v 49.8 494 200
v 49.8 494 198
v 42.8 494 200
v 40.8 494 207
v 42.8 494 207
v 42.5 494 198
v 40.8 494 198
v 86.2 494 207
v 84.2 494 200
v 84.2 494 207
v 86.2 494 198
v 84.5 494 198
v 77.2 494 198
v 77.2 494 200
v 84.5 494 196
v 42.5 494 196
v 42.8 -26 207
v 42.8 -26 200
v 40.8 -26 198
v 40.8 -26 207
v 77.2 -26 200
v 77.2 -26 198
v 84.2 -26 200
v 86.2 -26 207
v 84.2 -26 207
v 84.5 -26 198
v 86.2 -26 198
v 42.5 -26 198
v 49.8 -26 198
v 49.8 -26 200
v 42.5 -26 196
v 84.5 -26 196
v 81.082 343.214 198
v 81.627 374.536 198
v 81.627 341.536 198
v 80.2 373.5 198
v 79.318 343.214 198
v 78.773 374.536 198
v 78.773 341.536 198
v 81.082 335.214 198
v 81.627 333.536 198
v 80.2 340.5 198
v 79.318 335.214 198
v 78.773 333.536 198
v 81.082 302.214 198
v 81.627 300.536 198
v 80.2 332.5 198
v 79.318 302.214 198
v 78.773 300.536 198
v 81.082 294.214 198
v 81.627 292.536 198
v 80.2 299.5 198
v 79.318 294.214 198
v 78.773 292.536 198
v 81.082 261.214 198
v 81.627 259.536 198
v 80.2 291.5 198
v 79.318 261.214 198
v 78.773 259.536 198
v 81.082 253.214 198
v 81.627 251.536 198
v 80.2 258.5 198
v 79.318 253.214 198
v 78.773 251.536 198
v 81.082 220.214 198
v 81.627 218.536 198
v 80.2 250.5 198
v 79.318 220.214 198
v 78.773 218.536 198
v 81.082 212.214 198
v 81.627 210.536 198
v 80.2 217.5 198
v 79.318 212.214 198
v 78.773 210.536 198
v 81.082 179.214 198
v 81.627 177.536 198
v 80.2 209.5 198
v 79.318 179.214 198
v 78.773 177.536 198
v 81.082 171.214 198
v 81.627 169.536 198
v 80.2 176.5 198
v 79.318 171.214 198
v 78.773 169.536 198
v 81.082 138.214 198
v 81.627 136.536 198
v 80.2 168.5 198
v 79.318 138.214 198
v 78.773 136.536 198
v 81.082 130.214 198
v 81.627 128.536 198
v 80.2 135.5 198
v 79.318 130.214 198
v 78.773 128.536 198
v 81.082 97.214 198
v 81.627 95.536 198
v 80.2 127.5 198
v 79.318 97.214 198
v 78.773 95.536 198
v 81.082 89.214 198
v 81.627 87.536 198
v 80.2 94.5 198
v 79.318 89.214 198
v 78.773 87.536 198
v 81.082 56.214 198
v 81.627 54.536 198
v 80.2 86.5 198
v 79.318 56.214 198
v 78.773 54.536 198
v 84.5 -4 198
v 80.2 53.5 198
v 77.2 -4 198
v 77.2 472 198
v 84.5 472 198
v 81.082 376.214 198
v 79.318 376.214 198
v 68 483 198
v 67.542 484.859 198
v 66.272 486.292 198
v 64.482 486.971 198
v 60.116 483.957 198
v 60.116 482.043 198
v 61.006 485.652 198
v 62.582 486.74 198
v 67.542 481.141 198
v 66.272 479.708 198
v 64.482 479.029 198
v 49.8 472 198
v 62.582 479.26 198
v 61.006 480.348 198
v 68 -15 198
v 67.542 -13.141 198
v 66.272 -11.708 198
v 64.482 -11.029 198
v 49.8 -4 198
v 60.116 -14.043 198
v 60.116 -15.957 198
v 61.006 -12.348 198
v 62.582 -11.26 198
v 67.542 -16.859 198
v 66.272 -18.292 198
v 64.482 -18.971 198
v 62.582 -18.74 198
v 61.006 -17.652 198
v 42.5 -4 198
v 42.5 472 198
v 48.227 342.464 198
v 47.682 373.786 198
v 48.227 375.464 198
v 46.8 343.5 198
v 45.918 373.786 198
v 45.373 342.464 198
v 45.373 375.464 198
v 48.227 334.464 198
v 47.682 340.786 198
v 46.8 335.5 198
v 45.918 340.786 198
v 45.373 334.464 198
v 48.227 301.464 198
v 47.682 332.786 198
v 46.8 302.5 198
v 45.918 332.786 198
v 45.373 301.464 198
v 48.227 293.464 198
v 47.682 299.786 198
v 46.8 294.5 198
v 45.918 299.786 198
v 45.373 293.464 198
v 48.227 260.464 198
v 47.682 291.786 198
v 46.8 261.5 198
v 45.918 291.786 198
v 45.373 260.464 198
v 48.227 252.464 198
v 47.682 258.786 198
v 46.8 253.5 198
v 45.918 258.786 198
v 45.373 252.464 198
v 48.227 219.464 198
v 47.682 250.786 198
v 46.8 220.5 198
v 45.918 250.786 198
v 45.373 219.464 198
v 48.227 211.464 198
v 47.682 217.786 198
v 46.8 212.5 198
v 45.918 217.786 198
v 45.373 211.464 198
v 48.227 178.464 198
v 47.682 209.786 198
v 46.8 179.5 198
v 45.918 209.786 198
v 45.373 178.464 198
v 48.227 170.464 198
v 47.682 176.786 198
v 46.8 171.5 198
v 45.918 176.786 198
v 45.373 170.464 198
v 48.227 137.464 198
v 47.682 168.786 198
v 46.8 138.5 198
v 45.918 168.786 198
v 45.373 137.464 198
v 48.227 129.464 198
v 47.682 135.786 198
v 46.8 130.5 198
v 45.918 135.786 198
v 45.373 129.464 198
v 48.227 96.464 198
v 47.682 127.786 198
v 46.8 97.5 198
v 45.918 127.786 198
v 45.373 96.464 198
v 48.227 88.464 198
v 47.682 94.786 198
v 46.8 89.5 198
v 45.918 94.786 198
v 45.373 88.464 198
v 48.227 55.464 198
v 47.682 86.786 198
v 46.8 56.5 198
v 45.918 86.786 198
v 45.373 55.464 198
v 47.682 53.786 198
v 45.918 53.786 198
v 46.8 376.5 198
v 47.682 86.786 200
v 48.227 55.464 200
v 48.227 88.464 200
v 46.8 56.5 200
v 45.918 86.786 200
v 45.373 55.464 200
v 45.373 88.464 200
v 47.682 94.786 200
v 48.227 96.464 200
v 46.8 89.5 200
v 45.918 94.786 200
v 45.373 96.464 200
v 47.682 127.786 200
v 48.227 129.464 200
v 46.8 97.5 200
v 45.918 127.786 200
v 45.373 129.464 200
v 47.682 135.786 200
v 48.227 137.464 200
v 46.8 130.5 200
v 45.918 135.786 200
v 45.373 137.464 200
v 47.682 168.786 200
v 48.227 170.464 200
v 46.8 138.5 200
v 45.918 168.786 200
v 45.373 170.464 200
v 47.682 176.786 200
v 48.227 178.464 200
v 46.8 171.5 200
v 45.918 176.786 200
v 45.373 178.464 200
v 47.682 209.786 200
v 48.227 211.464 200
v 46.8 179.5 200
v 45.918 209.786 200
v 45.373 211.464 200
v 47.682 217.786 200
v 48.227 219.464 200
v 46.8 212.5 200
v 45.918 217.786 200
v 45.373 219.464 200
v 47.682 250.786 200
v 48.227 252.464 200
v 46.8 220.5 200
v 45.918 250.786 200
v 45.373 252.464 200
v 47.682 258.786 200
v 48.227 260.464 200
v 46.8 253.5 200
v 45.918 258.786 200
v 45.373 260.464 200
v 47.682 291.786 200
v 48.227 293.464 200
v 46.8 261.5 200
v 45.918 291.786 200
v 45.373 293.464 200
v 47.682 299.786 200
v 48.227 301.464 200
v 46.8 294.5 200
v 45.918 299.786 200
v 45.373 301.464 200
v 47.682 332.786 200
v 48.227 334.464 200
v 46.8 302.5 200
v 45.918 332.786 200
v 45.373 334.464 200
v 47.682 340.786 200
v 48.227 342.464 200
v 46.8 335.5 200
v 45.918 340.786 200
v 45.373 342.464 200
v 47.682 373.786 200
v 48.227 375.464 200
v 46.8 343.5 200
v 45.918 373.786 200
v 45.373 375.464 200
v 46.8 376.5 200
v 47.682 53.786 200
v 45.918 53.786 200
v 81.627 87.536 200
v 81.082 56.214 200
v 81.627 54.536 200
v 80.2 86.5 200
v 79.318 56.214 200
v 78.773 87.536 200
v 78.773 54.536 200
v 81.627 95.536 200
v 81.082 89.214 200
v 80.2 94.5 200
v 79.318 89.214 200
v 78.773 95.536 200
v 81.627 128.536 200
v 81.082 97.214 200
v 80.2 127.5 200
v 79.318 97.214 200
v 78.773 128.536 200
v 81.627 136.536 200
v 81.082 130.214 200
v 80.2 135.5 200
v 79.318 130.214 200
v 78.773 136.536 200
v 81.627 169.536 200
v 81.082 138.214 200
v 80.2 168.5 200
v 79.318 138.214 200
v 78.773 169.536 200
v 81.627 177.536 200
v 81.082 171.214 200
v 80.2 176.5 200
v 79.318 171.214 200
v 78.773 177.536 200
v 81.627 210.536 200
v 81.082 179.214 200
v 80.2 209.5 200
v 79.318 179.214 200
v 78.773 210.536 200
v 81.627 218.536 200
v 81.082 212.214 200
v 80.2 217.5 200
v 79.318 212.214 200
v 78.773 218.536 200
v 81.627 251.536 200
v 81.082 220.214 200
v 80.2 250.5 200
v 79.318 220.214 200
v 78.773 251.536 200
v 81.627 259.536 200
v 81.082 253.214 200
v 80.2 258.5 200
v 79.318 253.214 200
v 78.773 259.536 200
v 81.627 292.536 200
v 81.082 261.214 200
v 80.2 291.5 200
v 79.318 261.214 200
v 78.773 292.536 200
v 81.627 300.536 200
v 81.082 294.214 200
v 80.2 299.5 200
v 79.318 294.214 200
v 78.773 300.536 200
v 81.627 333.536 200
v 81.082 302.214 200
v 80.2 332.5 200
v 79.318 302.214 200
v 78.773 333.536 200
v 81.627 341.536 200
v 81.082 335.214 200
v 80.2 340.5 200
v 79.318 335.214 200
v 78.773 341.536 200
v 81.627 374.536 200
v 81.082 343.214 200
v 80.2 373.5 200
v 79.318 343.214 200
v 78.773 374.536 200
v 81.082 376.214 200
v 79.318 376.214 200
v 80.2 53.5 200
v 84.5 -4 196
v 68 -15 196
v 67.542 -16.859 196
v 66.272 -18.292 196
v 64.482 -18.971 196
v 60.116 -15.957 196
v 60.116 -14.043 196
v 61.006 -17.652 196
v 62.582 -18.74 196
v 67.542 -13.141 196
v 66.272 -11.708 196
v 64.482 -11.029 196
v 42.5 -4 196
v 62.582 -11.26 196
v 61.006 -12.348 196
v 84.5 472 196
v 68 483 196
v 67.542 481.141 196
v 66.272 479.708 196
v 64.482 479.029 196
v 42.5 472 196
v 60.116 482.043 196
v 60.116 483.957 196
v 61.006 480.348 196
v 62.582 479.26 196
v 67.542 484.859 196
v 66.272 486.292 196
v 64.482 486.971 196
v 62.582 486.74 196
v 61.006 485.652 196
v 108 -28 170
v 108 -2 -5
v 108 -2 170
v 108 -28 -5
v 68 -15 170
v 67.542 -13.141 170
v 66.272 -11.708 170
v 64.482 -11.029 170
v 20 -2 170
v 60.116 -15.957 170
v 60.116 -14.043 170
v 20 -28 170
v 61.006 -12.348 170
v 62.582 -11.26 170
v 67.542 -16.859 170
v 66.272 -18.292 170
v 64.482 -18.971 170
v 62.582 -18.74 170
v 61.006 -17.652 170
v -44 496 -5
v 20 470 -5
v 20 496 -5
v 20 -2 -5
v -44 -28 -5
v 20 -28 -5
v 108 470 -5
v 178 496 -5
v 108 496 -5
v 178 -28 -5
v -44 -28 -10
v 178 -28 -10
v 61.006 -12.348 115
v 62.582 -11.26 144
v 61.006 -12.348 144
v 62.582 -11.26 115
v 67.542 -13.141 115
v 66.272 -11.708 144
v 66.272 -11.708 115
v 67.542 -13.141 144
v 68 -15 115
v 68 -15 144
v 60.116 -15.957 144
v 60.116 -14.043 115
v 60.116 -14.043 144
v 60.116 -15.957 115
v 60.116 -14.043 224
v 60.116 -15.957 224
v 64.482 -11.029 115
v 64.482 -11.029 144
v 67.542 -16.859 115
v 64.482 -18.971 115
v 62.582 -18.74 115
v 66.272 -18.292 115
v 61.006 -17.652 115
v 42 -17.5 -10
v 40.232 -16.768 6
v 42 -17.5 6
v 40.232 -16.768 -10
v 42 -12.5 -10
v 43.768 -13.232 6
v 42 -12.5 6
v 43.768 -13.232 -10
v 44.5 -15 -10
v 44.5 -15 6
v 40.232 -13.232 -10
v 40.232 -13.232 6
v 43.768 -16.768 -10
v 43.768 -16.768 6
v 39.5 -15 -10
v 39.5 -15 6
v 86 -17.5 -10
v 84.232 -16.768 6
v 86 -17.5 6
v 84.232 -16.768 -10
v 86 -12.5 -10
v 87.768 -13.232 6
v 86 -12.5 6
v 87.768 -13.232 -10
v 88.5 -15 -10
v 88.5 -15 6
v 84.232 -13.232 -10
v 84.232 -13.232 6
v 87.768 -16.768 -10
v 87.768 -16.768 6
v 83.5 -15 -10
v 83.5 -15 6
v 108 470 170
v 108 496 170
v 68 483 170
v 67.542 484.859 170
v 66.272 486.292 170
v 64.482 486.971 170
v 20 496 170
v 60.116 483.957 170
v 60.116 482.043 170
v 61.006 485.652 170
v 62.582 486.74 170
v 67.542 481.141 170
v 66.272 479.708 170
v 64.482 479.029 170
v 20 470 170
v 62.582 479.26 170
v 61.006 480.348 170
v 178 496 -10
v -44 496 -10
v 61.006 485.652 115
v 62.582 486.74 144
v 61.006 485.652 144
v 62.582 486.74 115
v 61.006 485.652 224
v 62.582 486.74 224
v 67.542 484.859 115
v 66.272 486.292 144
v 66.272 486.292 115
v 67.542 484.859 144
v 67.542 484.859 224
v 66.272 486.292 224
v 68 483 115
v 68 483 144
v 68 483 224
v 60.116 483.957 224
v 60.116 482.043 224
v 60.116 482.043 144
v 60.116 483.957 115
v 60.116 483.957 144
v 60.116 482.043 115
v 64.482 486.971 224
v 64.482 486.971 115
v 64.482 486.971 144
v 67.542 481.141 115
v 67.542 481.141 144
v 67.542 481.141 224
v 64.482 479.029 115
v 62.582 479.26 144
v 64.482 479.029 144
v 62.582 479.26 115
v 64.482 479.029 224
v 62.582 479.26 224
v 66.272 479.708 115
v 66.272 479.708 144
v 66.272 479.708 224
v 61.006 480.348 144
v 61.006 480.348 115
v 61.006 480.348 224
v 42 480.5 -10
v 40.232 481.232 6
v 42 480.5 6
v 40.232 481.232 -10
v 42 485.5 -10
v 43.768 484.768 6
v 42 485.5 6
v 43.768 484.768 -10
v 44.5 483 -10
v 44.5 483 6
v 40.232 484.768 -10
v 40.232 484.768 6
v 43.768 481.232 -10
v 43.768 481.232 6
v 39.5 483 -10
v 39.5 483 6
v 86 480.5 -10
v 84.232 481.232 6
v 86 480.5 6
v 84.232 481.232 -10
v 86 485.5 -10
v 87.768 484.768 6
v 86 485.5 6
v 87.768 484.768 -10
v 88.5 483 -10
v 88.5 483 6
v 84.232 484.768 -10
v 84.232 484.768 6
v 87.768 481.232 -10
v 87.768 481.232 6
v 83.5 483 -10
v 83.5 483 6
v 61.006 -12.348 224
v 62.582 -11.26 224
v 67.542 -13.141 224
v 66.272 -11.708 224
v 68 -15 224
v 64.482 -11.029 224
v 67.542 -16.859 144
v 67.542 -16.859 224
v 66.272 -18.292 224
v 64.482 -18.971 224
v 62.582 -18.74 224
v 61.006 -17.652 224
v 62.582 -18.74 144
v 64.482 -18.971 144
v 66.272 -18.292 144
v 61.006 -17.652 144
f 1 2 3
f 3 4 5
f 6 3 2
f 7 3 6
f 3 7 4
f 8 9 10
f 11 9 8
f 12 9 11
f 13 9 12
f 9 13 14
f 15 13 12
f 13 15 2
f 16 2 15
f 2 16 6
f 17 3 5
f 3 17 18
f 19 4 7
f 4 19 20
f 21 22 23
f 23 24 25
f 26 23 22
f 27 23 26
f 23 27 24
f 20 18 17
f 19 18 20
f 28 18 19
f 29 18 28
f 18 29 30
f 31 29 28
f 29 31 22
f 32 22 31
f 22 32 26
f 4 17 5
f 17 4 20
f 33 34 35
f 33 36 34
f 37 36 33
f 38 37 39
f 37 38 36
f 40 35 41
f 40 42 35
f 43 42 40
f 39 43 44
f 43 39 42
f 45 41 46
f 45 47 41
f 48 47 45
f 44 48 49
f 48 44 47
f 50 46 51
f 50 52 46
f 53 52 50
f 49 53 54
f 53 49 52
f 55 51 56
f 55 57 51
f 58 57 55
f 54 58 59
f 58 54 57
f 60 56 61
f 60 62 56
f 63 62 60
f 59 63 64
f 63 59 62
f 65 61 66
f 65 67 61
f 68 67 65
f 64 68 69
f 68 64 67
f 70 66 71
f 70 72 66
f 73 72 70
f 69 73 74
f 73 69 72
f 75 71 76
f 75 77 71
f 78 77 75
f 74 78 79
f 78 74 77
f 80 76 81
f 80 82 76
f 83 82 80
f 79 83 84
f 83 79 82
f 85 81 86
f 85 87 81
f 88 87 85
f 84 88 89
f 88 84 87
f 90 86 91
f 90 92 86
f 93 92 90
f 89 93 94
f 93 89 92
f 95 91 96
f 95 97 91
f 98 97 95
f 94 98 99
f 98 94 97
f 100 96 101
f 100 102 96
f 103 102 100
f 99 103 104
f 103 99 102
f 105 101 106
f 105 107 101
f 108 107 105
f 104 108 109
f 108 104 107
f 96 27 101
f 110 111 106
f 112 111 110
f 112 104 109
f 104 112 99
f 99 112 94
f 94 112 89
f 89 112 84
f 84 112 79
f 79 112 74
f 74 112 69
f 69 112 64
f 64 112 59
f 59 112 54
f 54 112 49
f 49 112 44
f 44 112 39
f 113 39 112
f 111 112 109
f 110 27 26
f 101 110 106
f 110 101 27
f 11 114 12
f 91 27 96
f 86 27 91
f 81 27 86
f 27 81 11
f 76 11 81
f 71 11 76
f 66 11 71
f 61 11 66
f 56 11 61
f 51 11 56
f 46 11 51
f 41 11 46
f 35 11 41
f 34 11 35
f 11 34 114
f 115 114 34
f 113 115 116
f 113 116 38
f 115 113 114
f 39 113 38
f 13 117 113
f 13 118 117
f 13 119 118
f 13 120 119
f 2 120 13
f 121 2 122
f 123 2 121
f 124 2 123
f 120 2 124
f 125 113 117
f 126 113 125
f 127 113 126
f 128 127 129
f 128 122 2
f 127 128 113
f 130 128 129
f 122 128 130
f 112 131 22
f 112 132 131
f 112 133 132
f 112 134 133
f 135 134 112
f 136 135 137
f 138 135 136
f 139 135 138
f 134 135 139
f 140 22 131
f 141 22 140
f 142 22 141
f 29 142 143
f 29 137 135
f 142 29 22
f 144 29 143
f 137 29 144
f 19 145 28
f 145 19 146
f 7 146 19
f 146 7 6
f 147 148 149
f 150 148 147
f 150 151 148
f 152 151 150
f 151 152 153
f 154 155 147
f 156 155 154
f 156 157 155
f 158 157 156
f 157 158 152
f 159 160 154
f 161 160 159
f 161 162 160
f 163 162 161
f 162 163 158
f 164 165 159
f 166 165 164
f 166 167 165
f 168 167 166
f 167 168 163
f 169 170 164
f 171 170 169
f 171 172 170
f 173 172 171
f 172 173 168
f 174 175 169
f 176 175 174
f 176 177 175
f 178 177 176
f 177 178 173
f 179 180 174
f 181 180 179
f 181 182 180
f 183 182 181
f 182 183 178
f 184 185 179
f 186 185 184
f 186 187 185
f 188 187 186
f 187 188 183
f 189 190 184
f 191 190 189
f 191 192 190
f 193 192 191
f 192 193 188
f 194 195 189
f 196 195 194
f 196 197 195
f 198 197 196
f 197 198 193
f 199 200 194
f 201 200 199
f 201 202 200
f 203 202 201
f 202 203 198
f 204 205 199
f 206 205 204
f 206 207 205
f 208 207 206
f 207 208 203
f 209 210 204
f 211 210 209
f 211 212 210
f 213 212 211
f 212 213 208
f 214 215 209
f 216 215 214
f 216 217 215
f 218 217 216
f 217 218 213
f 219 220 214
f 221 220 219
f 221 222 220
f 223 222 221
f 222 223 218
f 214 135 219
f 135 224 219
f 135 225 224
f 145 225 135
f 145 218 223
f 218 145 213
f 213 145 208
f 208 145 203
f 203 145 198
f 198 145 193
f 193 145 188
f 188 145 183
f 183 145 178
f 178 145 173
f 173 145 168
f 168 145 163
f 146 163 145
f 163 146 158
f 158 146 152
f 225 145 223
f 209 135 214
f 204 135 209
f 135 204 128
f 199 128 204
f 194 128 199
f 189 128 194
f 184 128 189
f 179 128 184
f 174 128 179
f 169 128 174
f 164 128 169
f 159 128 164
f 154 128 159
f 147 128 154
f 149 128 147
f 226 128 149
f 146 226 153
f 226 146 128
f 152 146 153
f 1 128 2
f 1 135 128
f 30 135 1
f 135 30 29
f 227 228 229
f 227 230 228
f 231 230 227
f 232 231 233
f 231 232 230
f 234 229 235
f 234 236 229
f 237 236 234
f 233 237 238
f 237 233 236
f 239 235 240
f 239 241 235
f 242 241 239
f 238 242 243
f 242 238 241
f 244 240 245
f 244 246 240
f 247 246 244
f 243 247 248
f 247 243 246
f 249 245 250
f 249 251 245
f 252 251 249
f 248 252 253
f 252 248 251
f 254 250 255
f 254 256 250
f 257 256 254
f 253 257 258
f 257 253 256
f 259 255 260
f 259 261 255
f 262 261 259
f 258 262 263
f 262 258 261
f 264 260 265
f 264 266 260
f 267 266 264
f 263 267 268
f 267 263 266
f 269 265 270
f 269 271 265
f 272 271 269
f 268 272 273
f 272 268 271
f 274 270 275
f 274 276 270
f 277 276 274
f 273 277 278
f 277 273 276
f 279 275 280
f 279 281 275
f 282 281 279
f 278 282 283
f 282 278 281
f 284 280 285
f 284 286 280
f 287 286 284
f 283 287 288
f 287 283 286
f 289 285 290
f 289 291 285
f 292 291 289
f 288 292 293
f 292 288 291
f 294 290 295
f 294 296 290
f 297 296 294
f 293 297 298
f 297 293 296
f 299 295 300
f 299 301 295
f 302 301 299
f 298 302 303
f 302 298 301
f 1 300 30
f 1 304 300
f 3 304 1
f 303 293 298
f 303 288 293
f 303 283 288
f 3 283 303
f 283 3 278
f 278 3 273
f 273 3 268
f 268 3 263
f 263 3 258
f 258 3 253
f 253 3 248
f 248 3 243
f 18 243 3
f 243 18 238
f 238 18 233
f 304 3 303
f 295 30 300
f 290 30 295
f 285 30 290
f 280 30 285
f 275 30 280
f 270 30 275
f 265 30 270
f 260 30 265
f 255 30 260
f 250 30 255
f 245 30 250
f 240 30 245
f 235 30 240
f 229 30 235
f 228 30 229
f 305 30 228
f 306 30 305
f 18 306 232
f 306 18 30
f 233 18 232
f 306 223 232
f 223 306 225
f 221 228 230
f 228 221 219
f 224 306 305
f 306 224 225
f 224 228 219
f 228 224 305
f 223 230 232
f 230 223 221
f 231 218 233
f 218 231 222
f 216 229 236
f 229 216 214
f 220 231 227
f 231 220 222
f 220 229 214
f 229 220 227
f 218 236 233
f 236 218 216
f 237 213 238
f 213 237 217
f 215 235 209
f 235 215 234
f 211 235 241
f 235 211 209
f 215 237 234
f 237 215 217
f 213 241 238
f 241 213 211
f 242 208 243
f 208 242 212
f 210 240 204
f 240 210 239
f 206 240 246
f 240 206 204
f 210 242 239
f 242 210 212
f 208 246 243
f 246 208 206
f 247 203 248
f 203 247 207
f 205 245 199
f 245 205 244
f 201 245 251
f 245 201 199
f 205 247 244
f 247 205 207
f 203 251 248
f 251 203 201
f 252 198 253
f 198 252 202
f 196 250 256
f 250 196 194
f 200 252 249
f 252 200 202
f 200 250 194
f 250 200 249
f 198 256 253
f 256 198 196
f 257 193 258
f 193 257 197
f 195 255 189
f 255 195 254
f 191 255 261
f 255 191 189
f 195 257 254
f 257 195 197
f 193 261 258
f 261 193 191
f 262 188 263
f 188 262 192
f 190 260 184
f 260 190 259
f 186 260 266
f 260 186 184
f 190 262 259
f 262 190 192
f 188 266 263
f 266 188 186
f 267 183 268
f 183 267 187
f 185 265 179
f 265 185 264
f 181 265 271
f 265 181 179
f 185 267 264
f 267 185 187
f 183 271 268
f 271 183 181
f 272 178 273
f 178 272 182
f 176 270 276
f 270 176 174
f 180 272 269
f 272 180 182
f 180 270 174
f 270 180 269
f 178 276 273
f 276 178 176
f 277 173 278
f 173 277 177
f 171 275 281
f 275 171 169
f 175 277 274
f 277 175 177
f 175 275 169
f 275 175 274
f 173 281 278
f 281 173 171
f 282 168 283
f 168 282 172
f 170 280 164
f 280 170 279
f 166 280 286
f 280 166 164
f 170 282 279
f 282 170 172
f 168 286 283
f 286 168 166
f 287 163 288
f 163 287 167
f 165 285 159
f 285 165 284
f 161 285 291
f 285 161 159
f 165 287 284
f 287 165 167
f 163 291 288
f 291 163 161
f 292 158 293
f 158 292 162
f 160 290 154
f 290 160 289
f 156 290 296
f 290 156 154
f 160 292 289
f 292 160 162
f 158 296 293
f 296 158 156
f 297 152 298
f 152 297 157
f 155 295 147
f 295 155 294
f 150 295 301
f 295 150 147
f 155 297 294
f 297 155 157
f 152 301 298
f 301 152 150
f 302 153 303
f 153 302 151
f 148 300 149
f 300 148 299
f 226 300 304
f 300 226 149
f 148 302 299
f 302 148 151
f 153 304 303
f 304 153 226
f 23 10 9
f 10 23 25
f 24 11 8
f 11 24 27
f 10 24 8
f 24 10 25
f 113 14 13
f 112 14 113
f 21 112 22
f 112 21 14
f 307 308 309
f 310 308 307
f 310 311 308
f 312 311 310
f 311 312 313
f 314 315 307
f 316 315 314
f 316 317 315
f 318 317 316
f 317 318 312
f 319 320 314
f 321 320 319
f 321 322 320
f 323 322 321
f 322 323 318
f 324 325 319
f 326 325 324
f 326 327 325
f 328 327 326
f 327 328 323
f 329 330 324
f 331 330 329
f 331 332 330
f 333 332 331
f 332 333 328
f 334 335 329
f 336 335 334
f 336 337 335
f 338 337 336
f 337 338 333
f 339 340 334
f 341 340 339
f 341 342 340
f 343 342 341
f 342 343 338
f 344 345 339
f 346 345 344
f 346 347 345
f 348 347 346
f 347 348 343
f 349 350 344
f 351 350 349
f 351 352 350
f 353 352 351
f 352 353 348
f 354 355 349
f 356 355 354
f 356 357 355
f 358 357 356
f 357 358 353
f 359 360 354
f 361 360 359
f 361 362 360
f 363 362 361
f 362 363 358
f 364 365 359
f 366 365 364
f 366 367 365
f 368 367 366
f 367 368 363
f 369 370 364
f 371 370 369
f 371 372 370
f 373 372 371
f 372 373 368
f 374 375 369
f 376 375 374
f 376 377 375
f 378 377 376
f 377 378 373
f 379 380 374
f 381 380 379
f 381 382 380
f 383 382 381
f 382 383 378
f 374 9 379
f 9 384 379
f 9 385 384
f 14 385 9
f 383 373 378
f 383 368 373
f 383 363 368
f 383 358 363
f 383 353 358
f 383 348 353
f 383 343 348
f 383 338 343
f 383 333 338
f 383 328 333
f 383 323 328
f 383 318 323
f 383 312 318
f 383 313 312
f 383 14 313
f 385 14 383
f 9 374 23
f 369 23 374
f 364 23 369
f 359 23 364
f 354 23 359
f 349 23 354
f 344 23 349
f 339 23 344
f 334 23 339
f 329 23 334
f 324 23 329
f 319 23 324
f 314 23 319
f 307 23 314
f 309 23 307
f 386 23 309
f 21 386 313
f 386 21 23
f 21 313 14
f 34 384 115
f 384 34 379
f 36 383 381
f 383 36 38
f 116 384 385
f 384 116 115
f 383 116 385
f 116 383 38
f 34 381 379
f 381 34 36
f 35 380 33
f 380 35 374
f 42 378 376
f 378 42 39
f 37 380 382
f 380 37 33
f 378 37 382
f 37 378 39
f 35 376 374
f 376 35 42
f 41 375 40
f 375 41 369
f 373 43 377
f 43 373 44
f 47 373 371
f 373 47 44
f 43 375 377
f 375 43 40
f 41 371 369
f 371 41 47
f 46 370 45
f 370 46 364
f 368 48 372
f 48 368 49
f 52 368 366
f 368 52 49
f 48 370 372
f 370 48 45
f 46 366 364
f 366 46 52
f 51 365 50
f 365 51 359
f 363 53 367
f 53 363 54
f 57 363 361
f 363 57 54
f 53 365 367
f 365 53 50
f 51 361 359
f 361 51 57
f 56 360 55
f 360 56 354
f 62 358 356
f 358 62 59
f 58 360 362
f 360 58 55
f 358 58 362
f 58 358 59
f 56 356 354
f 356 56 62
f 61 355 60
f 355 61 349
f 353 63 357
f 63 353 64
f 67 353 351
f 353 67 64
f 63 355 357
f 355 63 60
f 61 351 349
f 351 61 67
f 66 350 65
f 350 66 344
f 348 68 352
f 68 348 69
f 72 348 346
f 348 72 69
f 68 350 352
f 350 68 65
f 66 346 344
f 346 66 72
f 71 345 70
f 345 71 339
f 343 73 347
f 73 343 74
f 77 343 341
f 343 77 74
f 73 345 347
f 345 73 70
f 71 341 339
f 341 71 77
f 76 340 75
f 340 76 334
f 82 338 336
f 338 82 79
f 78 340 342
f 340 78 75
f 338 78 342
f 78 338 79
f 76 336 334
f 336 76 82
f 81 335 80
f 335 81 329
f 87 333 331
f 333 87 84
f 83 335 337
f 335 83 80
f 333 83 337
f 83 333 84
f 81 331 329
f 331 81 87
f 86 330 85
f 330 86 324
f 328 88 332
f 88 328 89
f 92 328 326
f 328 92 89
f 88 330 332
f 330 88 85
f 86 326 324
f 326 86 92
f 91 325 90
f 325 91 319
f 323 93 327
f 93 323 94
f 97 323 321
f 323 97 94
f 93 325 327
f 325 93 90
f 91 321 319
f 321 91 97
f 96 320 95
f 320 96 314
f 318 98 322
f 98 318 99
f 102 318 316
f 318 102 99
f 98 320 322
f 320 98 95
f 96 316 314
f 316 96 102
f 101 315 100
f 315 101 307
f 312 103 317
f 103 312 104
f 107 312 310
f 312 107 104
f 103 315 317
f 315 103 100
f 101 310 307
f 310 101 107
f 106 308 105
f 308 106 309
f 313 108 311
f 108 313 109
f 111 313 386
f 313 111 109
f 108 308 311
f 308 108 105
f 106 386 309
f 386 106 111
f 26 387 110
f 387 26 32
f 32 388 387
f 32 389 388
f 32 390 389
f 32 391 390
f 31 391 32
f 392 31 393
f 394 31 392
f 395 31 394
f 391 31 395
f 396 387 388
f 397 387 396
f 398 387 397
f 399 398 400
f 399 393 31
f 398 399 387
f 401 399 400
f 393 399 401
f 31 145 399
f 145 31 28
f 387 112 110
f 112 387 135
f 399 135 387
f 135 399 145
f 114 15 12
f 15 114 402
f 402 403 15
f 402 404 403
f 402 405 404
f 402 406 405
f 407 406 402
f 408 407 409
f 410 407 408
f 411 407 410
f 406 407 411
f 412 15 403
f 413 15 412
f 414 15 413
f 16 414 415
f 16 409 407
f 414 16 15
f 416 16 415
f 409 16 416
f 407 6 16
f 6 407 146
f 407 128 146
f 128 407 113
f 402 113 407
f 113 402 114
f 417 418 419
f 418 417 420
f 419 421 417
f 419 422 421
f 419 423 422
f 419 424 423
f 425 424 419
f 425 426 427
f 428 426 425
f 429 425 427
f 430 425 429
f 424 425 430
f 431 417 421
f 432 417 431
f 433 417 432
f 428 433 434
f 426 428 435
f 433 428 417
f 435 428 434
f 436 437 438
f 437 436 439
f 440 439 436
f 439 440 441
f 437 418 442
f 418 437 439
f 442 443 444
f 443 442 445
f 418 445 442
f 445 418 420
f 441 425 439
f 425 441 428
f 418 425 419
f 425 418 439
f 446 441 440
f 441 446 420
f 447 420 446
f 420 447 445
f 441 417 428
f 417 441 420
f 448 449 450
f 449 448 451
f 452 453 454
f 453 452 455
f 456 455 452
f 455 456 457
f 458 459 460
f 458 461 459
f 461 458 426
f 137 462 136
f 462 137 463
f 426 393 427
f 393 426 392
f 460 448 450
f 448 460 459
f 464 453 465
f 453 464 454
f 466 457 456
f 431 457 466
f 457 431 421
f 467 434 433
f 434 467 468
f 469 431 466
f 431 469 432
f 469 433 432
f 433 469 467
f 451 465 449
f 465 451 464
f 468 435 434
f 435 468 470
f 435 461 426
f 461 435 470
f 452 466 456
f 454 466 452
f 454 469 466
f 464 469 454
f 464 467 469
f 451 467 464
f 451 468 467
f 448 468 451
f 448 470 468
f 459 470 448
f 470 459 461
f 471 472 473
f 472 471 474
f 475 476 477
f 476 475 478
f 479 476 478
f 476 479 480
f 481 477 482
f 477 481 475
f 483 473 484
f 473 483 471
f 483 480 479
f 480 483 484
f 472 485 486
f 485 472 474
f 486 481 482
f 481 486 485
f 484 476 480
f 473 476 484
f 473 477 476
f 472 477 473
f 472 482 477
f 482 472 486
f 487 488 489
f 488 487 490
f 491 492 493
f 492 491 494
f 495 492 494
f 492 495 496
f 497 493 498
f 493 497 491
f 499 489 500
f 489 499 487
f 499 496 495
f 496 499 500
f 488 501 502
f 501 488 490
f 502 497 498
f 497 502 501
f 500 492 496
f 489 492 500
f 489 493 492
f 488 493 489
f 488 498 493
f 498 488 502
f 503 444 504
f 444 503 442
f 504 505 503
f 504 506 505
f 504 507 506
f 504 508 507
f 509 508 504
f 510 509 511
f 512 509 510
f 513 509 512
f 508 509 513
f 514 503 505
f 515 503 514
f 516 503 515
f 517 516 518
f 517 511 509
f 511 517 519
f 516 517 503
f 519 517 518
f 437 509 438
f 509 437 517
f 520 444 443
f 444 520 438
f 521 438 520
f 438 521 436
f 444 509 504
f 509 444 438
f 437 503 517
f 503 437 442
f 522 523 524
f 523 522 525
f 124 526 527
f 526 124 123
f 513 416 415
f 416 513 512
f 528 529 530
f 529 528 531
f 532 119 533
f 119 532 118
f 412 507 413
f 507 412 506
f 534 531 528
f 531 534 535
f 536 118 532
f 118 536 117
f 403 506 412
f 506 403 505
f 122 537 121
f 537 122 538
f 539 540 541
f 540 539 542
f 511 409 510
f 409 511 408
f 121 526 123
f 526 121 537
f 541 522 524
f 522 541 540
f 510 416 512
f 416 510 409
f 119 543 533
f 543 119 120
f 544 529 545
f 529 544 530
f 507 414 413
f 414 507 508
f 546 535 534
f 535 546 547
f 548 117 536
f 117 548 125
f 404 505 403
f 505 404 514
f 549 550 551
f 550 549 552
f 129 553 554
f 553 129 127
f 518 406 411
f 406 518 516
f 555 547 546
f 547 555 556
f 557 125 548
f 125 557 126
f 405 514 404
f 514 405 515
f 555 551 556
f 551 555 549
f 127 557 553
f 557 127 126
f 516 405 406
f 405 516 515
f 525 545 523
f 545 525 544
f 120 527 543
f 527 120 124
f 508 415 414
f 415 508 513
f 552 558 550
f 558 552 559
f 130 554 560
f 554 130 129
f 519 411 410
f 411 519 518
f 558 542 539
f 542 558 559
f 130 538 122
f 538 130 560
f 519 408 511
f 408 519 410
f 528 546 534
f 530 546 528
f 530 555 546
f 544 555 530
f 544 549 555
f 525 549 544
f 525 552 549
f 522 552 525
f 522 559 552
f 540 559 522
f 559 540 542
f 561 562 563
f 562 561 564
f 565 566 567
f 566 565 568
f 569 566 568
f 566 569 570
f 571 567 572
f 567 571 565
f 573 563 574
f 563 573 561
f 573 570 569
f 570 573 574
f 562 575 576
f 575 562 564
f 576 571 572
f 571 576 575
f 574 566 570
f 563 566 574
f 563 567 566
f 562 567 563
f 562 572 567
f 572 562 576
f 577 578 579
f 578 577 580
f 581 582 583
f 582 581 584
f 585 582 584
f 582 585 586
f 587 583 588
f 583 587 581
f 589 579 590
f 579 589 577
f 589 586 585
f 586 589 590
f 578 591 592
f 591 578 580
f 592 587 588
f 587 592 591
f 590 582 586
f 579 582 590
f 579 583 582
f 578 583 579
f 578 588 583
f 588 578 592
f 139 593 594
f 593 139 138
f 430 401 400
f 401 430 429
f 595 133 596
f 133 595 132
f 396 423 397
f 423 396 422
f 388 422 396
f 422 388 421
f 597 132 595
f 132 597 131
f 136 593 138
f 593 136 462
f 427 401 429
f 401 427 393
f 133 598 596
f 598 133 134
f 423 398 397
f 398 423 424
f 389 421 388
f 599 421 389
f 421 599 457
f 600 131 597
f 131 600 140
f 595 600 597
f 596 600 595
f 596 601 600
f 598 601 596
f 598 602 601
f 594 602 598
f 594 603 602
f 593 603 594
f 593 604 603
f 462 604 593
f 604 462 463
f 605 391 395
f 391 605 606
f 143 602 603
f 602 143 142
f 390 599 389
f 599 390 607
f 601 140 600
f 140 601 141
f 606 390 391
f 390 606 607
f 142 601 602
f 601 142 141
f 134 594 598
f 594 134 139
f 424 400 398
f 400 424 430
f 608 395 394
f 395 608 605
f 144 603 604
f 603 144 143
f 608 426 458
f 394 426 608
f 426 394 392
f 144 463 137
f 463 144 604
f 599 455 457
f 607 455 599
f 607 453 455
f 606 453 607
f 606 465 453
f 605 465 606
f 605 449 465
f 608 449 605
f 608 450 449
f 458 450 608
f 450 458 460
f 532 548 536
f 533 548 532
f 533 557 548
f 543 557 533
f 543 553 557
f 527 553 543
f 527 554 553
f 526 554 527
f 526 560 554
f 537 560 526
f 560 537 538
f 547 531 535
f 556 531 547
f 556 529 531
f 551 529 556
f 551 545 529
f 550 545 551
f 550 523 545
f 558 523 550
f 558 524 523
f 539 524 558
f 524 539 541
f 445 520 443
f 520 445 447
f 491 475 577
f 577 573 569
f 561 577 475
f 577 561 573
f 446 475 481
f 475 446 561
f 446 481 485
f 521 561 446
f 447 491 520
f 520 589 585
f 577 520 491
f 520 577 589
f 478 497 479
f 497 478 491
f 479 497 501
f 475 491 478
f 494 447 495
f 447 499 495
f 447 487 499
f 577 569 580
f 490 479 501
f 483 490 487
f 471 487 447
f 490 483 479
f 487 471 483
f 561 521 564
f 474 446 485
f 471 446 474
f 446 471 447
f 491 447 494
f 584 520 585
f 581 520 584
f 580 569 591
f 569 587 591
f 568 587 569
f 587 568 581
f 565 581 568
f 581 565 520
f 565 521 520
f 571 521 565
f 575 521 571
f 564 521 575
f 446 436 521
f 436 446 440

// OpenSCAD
HOLDER_LENGTH = 520;

module column() {
    difference() {
        color([1,1,1]*.5) cube([88,26,170+5]);
        translate([88/2,26/2,170+5-55]) cylinder(d=8,h=55);
        translate([88/4,26/2,-1]) cylinder(d=5,h=12);
        translate([88/4*3,26/2,-1]) cylinder(d=5,h=12);
    }
}

module L_profil_1() {
    module perfil_L(L1, L2, length, thickness=2) {
        cube([length, L1+1, thickness]);
        cube([length,thickness,L2+1]);
    }
    difference() {
        perfil_L(8,8, length=HOLDER_LENGTH);
        translate([81,0,2]) for (i=[0:7]) {
            translate([i*41,4,4]) rotate(a=90,v=[1,0,0]) color("red") cylinder(d=3, h=2*3);
            translate([i*41+33,4,4]) rotate(a=90,v=[1,0,0]) color("red") cylinder(d=3, h=2*3);
        }
    }
}
module L_profil_2() {
    module perfil_L(L1, L2, length, thickness=2) {
        cube([length, L1+1, thickness]);
        cube([length,thickness,L2+1]);
    }
    difference() {
        perfil_L(8,8, length=HOLDER_LENGTH);
        translate([119,0,2]) for (i=[0:7]) {
            translate([i*41,4,4]) rotate(a=90,v=[1,0,0]) color("red") cylinder(d=3, h=2*3);
            translate([i*41+33,4,4]) rotate(a=90,v=[1,0,0]) color("red") cylinder(d=3, h=2*3);
        }
    }
}

module boards_holder() {
    translate([63.5,-26,198]) {
        translate([-21-1.7,0,0]) rotate(a=270, v=[0,-1,0]) rotate(a=90, v=[0,0,1]) L_profil_1();
        translate([21+1.7,0,0]) translate([0,HOLDER_LENGTH,0]) rotate(a=180, v=[0,0,1]) rotate(a=270, v=[0,-1,0]) rotate(a=90, v=[0,0,1]) L_profil_2();
        translate([-21,0,-2]) cube([42,22,2]);
        translate([-21,HOLDER_LENGTH-22,-2]) cube([42,22,2]);
    }
    translate([20,-28,-5]) color([1,1,1]*.5) column();
    translate([20,HOLDER_LENGTH-55+5,-5]) column();
    
    color([.5,.3,.3]) {
        translate([64,-15,144]) cylinder(d=8,h=80);
        translate([64,-15*2-7+HOLDER_LENGTH,144]) cylinder(d=8,h=80);
    }
}

module main_base() {
    difference() {
        translate([-44,-28,-5-5]) color([.5,1,.5]) cube([222,524,5]);
        translate([20,-28,-5-5]) {
            translate([88/4,26/2,-1]) cylinder(d=5,h=12);
            translate([88/4*3,26/2,-1]) cylinder(d=5,h=12);
        }
        translate([20,HOLDER_LENGTH-55+5,-5-5]) {
            translate([88/4,26/2,-1]) cylinder(d=5,h=12);
            translate([88/4*3,26/2,-1]) cylinder(d=5,h=12);
        }
    }
    
}

module boards_holder_with_main_base() {
    boards_holder();
    main_base();
}

boards_holder_with_main_base();
